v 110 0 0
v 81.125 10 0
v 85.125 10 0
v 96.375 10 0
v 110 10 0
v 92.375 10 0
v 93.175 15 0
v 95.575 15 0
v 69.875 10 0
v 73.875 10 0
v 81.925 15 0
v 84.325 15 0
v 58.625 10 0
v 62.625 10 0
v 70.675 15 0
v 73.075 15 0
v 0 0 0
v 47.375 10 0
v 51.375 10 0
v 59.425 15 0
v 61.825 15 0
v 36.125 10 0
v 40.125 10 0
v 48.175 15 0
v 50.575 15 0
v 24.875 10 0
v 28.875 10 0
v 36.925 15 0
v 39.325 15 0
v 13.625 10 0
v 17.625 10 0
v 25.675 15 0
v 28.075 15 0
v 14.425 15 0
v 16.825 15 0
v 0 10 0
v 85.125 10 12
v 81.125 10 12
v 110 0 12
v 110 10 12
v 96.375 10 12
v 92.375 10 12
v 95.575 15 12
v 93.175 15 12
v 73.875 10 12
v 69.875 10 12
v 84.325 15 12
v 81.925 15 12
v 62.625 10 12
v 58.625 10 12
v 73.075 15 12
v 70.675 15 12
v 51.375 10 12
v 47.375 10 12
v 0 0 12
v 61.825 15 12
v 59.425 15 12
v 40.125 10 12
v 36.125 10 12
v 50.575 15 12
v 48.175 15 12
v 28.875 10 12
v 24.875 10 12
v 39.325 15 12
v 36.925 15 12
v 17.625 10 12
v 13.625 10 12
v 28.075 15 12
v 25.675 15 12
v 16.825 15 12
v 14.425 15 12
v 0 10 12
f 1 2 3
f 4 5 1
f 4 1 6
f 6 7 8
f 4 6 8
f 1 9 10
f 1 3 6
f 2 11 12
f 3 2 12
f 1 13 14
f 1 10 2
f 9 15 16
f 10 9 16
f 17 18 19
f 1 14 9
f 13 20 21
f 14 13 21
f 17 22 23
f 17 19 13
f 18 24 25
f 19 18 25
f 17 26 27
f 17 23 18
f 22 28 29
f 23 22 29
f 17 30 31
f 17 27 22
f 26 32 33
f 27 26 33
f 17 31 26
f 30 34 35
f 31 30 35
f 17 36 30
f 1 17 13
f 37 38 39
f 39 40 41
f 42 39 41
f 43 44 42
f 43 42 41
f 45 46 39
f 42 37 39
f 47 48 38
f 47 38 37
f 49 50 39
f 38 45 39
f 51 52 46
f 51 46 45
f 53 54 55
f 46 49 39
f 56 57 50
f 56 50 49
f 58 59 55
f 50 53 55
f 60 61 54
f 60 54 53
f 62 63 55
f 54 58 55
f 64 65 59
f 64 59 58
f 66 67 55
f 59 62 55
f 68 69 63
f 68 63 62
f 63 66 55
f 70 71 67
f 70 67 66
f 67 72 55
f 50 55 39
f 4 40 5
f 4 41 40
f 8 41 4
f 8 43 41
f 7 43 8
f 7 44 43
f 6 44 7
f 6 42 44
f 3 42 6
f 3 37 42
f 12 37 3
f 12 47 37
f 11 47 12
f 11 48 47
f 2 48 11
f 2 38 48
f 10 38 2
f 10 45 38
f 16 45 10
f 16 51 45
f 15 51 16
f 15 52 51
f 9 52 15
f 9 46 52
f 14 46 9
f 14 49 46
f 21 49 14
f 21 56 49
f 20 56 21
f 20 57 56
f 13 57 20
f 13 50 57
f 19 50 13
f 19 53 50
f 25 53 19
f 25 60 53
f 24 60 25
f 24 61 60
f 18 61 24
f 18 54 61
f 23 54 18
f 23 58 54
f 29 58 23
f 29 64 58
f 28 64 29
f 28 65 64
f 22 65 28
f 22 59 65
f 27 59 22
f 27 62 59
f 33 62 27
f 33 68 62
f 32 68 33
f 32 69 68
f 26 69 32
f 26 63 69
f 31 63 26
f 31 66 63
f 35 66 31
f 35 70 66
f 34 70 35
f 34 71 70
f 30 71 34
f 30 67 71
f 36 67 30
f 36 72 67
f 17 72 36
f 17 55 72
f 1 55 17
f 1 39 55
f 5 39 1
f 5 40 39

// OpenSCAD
$fn = 32;

// ----------------------------------------------------------------------
// Gear rack: 8 teeth on a 110 mm bar, pitch 11.25 mm
// ----------------------------------------------------------------------

// --- parameters (mm) ---
profile_height = 12;      // extrusion height
profile_points = 36;      // points of the closed outline

profile = [[0, 0], [110, 0], [110, 10], [96.375, 10], [95.575, 15], [93.175, 15], [92.375, 10], [85.125, 10], [84.325, 15], [81.925, 15], [81.125, 10], [73.875, 10], [73.075, 15], [70.675, 15], [69.875, 10], [62.625, 10], [61.825, 15], [59.425, 15], [58.625, 10], [51.375, 10], [50.575, 15], [48.175, 15], [47.375, 10], [40.125, 10], [39.325, 15], [36.925, 15], [36.125, 10], [28.875, 10], [28.075, 15], [25.675, 15], [24.875, 10], [17.625, 10], [16.825, 15], [14.425, 15], [13.625, 10], [0, 10]];  // single closed polygon, 36 points, counter clockwise

// --- the one profile operation ---
linear_extrude(height = profile_height) polygon(points = profile);
